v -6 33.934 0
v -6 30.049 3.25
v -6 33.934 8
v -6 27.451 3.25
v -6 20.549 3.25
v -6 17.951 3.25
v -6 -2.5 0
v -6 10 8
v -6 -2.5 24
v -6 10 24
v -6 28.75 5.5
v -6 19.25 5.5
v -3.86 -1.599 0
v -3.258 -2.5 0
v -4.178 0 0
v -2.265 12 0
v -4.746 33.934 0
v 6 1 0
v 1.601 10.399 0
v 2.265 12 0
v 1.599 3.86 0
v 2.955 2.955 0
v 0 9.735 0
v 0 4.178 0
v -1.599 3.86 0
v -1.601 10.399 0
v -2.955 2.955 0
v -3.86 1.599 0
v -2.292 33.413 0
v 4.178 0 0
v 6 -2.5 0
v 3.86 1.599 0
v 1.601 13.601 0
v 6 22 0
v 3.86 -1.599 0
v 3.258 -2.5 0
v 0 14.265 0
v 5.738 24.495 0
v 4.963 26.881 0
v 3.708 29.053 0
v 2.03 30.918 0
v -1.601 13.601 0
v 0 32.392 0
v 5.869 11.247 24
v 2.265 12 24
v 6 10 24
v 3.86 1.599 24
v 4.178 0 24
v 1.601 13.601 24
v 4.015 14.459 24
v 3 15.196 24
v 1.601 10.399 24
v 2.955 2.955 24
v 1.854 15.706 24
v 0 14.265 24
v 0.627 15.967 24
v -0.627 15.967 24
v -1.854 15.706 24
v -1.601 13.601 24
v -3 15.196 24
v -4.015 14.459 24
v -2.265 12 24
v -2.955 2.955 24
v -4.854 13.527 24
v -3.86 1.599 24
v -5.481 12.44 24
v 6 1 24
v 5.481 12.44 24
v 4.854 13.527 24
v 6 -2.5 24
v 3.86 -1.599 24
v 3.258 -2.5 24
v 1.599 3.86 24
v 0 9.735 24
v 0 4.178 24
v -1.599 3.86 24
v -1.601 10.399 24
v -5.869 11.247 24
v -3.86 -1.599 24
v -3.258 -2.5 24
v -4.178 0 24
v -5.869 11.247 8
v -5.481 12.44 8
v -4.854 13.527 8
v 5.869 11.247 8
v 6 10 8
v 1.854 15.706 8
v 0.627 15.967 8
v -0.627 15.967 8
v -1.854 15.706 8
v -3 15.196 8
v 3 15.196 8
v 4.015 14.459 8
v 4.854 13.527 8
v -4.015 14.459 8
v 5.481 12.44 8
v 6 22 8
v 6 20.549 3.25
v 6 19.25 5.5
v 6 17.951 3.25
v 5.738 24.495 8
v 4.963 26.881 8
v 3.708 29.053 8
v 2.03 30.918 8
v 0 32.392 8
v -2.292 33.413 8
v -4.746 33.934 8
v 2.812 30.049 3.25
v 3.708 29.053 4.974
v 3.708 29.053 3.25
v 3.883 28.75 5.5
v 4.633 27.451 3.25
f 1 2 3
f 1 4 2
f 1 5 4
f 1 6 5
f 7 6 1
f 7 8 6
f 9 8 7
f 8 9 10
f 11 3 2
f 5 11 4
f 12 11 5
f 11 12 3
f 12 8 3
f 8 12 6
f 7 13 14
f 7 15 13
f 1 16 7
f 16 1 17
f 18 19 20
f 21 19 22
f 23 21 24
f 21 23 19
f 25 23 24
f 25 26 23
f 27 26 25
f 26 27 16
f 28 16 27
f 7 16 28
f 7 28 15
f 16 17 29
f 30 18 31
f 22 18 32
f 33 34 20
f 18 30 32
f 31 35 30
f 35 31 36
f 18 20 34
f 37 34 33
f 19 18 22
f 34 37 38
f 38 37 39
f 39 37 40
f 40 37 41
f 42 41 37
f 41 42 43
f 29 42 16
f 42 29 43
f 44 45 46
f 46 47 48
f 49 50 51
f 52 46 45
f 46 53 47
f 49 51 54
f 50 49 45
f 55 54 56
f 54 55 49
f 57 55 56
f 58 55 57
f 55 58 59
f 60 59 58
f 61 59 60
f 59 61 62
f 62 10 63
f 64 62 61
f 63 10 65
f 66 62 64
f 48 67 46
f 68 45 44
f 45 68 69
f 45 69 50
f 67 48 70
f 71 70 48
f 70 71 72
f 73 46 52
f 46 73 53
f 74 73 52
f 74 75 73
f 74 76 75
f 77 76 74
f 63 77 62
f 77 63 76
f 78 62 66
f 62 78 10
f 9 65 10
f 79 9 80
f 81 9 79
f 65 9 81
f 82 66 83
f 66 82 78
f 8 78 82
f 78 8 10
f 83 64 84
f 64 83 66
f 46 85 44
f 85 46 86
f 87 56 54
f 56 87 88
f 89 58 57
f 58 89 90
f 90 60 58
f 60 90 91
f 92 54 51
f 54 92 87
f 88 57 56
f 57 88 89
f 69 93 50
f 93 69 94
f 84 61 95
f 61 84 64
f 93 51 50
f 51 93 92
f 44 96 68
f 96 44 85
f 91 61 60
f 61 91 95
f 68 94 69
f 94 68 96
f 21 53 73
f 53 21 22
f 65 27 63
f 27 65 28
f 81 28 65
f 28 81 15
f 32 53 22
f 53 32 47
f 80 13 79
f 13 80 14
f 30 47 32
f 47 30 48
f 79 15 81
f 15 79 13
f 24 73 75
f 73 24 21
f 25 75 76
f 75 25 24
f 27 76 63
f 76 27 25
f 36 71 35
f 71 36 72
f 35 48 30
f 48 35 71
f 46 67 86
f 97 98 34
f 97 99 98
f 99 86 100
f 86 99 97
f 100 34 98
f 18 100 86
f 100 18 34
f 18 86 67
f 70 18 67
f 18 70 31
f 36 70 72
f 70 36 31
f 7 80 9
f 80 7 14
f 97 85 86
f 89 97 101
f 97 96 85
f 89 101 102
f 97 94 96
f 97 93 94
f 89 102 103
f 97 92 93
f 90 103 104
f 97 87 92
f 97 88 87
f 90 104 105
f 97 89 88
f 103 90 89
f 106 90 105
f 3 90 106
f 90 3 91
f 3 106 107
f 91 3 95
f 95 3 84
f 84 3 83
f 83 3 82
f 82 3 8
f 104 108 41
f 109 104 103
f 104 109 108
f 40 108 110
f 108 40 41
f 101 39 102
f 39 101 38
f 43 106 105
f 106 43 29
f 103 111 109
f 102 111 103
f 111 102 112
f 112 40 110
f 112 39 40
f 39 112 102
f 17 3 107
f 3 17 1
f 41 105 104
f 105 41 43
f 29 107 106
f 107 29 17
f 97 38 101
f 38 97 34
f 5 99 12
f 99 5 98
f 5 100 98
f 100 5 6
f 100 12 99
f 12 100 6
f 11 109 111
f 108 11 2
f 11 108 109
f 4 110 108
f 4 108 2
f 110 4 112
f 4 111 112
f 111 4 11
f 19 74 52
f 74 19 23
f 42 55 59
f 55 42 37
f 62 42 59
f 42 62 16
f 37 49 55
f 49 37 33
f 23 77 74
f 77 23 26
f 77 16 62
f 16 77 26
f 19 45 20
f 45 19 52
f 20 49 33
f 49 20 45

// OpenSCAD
// file: polyholes.scad
//
// Mendel90
//
// GNU GPL v2
// nop.head@gmail.com
// hydraraptor.blogspot.com
//
// See http://hydraraptor.blogspot.com/2011/02/polyholes.html
//
function sides(r) = max(round(4 *r),3);
function corrected_radius(r,n) = 0.1 + r / cos(180 / n);
function corrected_diameter(d) = 0.2 + d / cos(180 / sides(d / 2));

module poly_circle(r, center = false) {
    n = sides(r);
    circle(r = corrected_radius(r,n), $fn = n, center = center);
}

module poly_cylinder(r, h, center = false) {
    n = sides(r);
    cylinder(h = h, r = corrected_radius(r,n), $fn = n, center = center);
}

module poly_d_cylinder(r, center = false) {
    n = sides(r);
    r = corrected_radius(r,n);
    cylinder(h = h, r = r, $fn = n, center = center);
    translate([0, -r, 0])
        cube([r, 2 * r, h]);
}
// file: bracket.scad
$fa = 12;
$fs = 0.5;
use <polyholes.scad>

w = 60; // Smooth rod distance (center to center)

module screws() {
  for (x = [-w/2, w/2]) {
    translate([x, 0, 0]) {
      // Push-through M3 screw hole.
      translate([0, -6, 0]) rotate([0, 90, 0])
	poly_cylinder(r=1.5, h=20, center=true);
      // M3 nut holder.
      translate([-x/5, -6, 0])
	rotate([30, 0, 0]) rotate([0, 90, 0])
	cylinder(r=3.2, h=2.3, center=true, $fn=6);
    }
  }
}

module bracket(h) {
  difference() {
    union() {
      translate([0, -1, 0]) cube([w+12, 22, h], center=true);
      // Sandwich mount.
      translate([-w/2, 10, 0]) cylinder(r=6, h=h, center=true);
      translate([w/2, 10, 0]) cylinder(r=6, h=h, center=true);
    }
    // Sandwich mount.
    translate([-w/2, 12, 0]) poly_cylinder(r=1.5, h=h+1, center=true);
    translate([w/2, 12, 0]) poly_cylinder(r=1.5, h=h+1, center=true);
    // Smooth rod mounting slots.
    for (x = [-w/2, w/2]) {
      translate([x, 0, 0]) {
	poly_cylinder(r=4, h=h+1, center=true);
	translate([0, -10, 0]) cube([2, 20, h+1], center=true);
      }
    }
    // Belt path.
    translate([0, -5, 0]) cube([w-20, 20, h+1], center=true);
    translate([0, -9, 0]) cube([w-12, 20, h+1], center=true);
    translate([-w/2+10, 1, 0]) cylinder(r=4, h=h+1, center=true);
    translate([w/2-10, 1, 0]) cylinder(r=4, h=h+1, center=true);
  }
}

translate([0, 0, 10]) bracket(20);
// main file
use <bracket.scad>;
use <polyholes.scad>

h = 24; // Total height.
b = 8; // Bottom height (where the micro switch is attached).

module microswitch() {
  union() {
    translate([0, -3.5, 2.5]) cube([6.3, 19.66, 10.55], center=true);
    translate([0, 0, 8]) cube([3.5, 2, 3], center=true);
  }
}

x = -45 * cos(30);
y = 50 - 45 * sin(30);
a = 0;  // Micro switch angle for rotation around Z axis.

% translate([30+x, y, 4]) rotate([0, 180, -a]) microswitch();

module endstop() {
  difference() {
    union() {
      translate([0, 0, -h/2]) intersection() {
        bracket(h);
        translate([30, 10, 0]) cube([12, 25, h], center=true);
      }
      translate([30, 16, -b/2]) cube([12, 12, b], center=true);
      translate([30, 22, -b/2]) intersection() {
        cube([12, 24, b], center=true);
        translate([6, 0, 0]) cylinder(r=12, h=b, center=true);
      }
    }
    // M2.5x12 micro switch mounting screws.
    # translate([-x, y, -b/2]) rotate([0, 0, a]) {
      translate([0, -3.5-9.5/2, 0]) rotate([0, 90, 0])
        poly_cylinder(r=0.7, h=36, center=true, $fn=12);
      translate([0, -3.5+9.5/2, 0]) rotate([0, 90, 0])
        poly_cylinder(r=0.7, h=36, center=true, $fn=12);
    }
    // Push-through hole for vertical M4 screw.
    translate([30, 12, -h/2])
      # poly_cylinder(r=2, h=2*h, center=true, $fn=12);
  }
}

translate([30, 0, 0]) rotate([0, 180, 0]) endstop();

// use <platform.scad>;
// translate([30, 50, -16]) platform();
translate([30, 50, -16]) rotate([0, 0, 120]) translate([0, 45, 0])
% cylinder(r=1.5, h=20, center=true, $fn=12);
